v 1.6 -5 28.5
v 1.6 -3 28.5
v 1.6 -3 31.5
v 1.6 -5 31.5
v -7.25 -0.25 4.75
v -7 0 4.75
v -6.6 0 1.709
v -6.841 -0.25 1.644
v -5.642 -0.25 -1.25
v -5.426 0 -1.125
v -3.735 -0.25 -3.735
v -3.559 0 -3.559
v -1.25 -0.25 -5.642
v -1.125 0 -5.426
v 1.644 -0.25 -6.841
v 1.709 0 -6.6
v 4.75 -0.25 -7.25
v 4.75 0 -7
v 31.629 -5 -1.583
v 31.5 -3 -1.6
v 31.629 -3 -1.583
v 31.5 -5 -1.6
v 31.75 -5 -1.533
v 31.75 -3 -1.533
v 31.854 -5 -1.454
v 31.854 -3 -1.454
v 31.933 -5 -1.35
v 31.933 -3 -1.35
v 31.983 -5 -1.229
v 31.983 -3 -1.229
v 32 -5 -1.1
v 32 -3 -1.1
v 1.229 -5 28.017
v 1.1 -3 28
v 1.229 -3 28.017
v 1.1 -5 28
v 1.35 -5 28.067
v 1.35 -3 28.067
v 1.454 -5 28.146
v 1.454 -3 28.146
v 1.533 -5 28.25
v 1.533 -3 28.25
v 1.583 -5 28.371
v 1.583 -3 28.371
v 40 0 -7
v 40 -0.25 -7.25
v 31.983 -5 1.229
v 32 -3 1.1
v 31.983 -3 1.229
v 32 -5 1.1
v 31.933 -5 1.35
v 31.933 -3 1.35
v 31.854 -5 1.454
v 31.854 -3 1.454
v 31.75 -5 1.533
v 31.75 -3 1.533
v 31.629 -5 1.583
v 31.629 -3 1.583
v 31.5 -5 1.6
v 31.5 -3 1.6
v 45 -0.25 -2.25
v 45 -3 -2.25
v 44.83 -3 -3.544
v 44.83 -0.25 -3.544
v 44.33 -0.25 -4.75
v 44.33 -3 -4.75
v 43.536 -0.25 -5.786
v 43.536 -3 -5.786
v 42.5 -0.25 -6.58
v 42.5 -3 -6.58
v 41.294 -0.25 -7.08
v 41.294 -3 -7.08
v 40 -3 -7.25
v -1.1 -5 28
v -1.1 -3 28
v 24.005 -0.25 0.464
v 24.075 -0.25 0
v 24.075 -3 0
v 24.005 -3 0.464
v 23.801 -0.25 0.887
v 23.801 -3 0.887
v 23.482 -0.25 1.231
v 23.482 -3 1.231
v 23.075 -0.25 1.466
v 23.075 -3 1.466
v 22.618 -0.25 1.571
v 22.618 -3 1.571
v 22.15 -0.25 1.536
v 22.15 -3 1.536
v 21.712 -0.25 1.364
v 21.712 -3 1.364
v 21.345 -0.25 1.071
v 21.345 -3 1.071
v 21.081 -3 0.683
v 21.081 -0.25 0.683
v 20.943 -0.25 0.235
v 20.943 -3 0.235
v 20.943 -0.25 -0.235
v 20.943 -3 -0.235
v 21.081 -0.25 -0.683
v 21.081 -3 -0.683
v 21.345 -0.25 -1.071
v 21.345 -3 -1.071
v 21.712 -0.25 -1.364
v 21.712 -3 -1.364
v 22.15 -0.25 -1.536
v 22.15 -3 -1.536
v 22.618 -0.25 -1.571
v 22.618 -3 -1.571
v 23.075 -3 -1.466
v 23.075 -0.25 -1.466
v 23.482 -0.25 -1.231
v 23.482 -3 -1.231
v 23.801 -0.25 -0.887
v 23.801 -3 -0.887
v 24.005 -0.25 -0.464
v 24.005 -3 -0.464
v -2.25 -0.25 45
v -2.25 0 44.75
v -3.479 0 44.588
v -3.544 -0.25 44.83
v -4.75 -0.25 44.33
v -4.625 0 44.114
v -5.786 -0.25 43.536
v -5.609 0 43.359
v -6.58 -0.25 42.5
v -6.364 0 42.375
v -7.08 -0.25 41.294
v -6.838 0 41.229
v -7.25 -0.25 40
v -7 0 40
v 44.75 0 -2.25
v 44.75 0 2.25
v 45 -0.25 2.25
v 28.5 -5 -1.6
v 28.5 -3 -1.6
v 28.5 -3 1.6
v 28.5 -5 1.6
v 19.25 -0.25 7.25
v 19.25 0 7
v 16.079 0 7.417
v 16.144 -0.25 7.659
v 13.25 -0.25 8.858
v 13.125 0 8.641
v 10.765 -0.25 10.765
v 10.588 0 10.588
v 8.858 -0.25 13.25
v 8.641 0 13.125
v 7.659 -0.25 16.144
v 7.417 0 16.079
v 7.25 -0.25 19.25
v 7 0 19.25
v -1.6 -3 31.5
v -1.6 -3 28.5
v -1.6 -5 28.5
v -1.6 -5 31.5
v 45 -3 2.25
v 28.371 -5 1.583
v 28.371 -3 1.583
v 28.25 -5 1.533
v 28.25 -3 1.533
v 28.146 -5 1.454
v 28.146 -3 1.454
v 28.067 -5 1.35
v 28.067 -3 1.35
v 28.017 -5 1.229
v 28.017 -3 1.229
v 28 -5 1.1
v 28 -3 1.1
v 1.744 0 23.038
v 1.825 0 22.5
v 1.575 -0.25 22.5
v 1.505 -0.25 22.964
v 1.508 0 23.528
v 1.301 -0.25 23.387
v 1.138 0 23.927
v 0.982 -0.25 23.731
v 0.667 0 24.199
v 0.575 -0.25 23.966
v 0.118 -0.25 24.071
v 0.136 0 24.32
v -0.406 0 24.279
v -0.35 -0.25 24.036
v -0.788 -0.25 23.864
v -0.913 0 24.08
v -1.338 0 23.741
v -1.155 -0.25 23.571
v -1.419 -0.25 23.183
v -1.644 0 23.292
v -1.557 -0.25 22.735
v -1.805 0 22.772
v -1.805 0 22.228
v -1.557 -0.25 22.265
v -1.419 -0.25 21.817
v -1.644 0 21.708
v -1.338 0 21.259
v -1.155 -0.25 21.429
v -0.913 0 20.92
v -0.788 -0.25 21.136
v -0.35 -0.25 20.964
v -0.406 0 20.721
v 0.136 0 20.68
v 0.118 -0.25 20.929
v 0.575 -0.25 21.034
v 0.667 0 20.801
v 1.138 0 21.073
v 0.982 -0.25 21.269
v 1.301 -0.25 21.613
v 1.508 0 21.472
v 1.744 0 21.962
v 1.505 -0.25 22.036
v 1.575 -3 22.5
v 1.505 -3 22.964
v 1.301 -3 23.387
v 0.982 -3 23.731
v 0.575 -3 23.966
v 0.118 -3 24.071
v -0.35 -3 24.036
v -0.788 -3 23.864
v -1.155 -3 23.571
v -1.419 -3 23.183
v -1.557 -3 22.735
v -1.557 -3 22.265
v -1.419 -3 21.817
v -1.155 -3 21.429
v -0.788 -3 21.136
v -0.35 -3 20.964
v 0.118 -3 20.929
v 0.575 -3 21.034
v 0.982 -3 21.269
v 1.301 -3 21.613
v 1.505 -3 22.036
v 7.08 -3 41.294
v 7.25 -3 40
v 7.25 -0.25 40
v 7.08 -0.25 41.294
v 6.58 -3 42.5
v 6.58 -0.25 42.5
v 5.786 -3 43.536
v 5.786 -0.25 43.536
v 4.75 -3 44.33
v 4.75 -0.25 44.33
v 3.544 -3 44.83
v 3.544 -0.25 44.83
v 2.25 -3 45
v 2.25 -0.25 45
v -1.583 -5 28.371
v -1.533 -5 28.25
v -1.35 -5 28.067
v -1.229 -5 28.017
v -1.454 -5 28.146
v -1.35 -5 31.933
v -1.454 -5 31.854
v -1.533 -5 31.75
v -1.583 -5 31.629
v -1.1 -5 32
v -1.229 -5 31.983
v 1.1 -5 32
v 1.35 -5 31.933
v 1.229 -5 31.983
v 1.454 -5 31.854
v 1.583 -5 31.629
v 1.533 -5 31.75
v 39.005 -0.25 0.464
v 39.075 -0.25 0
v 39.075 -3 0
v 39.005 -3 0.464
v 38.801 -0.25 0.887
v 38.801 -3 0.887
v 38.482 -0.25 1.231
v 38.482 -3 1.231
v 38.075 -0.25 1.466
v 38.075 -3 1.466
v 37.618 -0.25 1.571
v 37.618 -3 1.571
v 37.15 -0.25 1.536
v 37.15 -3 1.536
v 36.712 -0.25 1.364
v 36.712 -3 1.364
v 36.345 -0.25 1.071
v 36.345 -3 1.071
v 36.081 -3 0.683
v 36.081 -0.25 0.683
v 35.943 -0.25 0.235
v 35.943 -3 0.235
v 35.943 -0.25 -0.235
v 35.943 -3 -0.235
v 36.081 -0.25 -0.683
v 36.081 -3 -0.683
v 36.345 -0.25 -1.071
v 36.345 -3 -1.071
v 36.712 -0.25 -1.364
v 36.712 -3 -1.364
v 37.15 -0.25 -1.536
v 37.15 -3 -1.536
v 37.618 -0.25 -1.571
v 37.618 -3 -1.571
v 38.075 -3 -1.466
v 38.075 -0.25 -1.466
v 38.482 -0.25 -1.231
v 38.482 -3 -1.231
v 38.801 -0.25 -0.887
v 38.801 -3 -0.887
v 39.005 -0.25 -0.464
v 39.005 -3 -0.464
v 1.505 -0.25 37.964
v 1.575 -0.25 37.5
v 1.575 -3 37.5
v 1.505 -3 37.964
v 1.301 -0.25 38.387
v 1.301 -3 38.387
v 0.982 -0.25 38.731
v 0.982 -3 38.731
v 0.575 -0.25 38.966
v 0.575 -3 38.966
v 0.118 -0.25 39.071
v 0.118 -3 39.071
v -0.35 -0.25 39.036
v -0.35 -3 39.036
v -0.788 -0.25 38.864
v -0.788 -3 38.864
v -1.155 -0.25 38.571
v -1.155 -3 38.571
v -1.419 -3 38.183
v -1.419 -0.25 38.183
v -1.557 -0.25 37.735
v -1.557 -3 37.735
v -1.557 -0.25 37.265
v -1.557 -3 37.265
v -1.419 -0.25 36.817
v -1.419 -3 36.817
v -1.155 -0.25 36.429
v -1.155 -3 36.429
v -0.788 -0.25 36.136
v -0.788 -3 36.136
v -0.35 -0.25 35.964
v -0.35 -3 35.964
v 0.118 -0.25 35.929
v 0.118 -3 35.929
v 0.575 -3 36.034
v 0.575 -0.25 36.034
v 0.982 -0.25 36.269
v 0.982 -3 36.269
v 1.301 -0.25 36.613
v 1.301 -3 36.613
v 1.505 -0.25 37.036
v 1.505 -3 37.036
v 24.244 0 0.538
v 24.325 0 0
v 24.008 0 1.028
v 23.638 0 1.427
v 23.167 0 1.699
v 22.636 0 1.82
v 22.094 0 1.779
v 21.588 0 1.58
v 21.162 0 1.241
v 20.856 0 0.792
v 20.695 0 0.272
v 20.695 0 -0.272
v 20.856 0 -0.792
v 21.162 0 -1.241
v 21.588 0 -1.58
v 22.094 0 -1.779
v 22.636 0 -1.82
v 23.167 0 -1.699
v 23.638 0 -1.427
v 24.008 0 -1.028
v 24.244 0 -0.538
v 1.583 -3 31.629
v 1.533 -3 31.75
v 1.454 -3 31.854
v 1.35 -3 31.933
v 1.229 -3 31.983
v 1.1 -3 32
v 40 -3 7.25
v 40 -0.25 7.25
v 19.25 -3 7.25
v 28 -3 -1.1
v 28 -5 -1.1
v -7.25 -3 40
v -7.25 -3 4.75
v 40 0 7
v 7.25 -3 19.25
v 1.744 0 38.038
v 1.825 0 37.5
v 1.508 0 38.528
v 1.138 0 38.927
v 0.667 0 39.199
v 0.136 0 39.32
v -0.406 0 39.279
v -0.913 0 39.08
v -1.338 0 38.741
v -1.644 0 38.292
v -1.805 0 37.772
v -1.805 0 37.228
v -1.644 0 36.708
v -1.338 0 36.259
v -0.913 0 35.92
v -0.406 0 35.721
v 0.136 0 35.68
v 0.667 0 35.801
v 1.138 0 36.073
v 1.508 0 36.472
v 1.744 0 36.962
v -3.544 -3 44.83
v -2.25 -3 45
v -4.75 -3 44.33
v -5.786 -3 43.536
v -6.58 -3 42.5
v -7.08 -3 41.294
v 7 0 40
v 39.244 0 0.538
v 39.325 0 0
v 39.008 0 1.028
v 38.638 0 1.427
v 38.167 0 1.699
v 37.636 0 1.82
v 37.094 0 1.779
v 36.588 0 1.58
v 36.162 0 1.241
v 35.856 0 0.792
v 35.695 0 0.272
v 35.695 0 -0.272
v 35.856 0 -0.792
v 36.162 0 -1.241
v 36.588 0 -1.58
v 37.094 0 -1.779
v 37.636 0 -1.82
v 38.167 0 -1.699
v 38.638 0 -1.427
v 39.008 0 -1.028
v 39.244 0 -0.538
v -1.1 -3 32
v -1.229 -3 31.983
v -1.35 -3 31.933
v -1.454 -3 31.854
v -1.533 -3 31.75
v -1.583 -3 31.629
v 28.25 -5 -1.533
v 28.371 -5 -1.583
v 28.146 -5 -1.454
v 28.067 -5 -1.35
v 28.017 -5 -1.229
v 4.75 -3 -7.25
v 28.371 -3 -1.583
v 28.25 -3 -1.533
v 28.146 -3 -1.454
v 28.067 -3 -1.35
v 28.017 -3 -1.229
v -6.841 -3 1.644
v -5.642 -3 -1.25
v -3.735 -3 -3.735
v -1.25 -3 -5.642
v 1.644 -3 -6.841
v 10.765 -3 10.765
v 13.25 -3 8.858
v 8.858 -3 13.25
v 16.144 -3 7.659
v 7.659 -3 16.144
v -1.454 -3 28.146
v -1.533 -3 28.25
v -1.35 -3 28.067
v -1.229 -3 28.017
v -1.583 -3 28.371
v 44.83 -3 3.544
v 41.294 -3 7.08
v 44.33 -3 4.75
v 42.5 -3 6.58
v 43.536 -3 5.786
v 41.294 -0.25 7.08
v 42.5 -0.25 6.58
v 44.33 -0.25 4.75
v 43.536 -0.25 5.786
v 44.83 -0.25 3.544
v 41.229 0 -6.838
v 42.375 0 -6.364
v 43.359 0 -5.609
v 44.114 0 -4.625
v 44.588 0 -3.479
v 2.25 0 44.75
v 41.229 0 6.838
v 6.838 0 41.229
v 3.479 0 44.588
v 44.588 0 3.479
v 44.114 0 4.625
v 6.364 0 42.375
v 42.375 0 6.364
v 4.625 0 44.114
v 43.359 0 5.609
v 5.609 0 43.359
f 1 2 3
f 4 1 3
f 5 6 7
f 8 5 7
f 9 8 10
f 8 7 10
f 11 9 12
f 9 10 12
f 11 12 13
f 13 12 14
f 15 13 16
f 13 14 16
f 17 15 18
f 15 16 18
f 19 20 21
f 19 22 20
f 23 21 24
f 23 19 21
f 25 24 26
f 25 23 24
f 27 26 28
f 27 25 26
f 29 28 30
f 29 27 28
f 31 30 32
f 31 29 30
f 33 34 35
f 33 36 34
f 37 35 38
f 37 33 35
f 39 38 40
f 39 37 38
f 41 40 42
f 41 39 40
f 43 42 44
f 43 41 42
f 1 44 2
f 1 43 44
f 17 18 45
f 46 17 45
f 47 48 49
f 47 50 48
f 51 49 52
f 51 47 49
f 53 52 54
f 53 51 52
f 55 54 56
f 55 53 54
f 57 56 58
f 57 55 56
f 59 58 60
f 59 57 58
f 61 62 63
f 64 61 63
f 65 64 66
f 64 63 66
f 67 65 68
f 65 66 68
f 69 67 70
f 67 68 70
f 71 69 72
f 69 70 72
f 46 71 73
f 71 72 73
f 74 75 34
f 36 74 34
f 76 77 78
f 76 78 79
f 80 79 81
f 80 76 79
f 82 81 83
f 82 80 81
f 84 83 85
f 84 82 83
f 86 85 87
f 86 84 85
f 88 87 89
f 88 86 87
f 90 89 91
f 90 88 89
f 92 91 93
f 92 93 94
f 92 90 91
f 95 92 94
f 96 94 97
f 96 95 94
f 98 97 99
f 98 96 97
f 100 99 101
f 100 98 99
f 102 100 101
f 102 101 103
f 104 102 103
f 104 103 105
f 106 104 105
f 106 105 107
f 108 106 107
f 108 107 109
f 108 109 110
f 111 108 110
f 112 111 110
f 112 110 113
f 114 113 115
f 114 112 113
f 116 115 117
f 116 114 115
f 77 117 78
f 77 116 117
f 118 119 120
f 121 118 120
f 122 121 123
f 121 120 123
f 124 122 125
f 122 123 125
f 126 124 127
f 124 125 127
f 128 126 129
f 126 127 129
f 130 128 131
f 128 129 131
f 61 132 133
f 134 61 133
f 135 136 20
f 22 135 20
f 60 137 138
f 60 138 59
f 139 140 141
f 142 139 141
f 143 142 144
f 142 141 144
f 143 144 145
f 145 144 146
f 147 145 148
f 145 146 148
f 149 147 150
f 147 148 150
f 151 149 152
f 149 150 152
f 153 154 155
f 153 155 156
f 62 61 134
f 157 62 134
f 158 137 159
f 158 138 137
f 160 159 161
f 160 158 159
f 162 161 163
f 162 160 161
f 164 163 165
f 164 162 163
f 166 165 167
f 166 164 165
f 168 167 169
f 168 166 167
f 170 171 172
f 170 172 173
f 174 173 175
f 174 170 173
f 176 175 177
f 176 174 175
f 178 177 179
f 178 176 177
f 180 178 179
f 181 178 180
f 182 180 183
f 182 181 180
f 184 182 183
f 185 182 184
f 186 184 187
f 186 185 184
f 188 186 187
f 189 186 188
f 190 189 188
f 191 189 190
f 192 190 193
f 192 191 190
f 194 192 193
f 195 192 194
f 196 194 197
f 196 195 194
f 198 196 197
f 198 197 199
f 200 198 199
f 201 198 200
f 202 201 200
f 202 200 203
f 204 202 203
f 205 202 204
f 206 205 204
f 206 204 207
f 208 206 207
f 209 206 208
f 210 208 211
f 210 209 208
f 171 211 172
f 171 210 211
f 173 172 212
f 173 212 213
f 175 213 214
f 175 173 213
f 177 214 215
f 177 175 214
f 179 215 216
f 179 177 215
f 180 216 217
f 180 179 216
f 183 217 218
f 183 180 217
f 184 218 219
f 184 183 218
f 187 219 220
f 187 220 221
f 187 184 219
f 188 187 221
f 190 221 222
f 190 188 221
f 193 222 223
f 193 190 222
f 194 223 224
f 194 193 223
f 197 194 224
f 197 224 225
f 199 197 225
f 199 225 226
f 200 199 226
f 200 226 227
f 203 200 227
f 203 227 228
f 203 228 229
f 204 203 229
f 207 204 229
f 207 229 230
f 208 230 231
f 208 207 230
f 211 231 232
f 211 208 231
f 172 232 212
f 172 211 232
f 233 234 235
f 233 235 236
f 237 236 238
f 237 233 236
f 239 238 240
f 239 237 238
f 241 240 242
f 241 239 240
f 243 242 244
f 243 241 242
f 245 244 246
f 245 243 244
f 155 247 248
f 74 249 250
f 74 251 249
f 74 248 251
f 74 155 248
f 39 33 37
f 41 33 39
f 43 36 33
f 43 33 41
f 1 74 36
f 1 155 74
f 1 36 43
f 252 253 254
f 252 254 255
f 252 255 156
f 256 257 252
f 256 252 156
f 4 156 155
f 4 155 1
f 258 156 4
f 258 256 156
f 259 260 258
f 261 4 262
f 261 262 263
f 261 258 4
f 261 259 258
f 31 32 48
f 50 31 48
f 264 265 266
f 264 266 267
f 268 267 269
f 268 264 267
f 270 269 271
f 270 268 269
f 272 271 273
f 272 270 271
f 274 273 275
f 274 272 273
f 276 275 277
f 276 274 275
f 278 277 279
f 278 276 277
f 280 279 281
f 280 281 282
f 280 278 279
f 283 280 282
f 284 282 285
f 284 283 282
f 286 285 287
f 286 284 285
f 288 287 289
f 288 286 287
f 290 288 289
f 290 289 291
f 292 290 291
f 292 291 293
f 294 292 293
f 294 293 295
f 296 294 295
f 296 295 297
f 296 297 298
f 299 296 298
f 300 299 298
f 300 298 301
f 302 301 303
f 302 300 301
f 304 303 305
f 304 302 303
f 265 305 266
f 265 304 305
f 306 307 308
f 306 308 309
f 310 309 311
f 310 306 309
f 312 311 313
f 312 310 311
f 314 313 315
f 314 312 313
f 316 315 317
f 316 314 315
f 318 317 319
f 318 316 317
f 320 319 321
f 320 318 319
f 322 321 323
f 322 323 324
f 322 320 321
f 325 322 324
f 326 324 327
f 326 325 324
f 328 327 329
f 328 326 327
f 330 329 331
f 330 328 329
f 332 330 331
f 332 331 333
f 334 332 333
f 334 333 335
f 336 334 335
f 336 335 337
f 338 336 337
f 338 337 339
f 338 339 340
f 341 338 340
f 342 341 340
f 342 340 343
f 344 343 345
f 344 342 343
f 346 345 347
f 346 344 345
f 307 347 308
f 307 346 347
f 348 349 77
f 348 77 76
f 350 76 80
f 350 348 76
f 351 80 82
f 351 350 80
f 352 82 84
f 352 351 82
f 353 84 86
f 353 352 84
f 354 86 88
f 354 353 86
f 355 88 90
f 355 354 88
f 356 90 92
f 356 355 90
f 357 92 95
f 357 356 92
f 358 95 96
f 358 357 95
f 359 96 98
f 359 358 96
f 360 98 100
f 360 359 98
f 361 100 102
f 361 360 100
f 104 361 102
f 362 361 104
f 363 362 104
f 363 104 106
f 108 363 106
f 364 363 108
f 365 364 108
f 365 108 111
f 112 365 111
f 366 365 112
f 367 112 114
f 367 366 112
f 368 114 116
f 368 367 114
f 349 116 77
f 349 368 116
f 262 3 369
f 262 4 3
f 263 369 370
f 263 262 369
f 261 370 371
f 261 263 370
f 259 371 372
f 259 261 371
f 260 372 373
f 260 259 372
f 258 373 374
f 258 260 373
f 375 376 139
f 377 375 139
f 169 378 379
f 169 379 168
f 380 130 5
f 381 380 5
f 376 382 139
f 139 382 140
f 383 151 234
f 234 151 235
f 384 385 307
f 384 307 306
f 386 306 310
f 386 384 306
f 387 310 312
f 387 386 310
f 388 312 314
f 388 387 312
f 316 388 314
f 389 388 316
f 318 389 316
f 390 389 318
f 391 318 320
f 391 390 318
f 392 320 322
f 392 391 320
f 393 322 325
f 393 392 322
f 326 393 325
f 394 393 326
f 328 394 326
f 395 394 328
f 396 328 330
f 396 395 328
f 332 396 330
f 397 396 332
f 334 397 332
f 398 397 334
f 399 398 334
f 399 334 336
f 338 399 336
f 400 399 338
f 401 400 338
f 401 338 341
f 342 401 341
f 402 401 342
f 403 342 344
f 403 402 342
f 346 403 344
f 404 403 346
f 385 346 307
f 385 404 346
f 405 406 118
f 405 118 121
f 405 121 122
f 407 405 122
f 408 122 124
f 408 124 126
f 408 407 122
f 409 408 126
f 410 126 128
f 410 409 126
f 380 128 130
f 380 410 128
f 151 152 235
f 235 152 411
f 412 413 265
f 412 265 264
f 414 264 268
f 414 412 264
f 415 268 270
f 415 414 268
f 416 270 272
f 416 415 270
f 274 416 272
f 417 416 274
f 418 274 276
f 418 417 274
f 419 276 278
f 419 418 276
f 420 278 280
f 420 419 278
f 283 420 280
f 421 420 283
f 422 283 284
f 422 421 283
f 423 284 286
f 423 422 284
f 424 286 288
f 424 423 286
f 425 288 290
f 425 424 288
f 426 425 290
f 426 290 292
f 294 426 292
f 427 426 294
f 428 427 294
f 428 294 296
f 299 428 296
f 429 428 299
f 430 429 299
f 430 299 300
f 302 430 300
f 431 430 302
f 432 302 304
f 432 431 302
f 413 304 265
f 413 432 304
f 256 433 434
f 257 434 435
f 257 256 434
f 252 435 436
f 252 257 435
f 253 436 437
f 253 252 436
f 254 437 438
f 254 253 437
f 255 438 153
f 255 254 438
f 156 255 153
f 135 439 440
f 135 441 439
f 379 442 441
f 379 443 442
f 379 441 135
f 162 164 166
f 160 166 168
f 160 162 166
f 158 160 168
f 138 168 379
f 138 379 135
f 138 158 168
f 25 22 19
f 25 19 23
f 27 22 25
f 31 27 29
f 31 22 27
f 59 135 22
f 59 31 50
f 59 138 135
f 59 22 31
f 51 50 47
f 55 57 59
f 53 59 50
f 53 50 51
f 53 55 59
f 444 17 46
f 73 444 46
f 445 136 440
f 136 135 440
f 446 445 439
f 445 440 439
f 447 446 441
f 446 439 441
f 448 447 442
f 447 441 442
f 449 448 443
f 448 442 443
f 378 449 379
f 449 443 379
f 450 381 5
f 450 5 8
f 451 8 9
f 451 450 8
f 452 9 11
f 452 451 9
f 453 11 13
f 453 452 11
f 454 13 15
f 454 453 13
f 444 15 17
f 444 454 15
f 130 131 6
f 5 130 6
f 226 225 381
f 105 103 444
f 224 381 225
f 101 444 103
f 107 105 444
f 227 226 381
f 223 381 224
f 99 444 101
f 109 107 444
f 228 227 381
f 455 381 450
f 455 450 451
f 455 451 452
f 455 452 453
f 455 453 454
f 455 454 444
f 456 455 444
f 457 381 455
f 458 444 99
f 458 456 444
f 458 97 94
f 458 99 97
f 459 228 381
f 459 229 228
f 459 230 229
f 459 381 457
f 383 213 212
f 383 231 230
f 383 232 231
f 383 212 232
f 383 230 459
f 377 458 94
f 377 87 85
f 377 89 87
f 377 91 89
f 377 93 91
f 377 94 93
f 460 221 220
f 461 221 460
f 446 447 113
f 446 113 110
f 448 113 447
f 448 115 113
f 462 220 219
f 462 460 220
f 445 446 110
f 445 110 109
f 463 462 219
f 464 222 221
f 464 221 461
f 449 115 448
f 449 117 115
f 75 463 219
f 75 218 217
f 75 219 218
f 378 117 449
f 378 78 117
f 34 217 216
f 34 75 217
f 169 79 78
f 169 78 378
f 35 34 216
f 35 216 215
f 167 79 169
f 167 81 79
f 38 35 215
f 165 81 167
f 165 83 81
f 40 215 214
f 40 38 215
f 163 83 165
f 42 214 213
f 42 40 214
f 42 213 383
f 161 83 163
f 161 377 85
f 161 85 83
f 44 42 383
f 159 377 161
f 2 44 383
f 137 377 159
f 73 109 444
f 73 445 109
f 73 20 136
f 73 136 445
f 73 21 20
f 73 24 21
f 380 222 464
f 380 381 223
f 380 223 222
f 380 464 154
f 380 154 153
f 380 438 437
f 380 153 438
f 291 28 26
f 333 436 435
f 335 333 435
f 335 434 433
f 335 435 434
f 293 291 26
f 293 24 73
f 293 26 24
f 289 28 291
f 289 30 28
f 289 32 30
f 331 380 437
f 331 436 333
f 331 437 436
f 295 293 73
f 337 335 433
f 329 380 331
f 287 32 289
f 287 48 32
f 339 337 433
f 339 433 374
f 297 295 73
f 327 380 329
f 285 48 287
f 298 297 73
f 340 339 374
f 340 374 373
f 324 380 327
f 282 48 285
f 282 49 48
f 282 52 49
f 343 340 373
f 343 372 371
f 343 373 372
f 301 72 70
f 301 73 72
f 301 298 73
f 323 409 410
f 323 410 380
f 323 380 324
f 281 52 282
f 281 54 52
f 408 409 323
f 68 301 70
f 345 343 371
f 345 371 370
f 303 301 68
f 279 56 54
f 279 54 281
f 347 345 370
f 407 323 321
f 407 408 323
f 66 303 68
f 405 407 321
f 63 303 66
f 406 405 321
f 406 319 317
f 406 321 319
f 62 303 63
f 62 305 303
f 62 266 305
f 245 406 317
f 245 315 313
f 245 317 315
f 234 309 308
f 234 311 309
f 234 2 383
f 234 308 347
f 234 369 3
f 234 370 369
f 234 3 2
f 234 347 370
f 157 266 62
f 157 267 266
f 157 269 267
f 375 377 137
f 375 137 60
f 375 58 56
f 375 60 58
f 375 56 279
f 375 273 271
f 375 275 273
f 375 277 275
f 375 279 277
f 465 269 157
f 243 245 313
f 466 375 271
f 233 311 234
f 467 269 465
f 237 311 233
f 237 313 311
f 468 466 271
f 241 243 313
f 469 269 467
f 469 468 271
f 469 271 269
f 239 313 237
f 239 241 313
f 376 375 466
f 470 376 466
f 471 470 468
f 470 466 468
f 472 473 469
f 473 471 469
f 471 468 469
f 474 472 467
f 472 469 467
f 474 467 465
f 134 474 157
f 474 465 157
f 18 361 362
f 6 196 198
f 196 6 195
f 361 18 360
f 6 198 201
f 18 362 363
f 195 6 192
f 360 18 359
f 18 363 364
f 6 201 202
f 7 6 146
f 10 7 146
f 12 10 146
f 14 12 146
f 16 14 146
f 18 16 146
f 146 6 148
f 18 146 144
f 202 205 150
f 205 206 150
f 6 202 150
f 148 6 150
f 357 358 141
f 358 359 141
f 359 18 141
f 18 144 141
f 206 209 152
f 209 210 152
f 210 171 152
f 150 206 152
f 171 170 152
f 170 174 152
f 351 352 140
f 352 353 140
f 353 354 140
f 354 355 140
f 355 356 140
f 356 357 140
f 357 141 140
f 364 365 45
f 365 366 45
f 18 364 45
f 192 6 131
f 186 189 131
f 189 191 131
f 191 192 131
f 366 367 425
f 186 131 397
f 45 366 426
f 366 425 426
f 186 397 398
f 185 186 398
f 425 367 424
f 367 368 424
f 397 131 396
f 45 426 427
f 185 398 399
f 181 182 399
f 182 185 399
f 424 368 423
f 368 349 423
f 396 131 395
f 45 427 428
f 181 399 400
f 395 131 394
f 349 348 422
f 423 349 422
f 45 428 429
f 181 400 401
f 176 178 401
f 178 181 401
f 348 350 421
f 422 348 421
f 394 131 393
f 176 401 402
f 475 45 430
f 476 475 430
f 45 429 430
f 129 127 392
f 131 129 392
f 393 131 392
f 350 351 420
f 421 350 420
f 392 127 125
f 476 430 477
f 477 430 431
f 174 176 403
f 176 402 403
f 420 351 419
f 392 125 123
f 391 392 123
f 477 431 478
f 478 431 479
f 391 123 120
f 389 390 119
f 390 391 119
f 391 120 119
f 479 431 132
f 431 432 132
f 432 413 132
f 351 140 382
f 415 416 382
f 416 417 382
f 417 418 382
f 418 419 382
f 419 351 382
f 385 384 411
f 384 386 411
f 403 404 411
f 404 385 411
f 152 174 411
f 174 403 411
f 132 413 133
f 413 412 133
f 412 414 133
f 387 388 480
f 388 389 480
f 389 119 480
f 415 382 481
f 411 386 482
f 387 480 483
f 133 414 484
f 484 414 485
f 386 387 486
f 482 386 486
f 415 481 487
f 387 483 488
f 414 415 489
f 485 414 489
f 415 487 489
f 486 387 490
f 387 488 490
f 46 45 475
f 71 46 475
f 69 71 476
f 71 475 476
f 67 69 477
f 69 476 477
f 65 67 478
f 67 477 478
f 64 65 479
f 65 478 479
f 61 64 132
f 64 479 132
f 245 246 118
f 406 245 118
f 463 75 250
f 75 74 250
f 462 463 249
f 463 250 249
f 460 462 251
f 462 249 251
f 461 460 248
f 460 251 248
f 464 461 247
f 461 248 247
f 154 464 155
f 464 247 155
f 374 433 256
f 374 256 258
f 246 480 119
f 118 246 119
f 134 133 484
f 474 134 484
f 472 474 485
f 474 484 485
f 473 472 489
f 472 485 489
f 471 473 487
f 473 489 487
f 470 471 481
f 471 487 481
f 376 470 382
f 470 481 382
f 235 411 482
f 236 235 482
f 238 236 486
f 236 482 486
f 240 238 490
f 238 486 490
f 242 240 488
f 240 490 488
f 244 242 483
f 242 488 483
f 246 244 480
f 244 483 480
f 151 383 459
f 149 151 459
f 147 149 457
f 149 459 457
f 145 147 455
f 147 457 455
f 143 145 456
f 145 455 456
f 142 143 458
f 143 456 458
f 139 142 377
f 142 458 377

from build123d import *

# Parameters (mm, degrees)
F0_R     = 1.575
F1_DEPTH = 3
F2_R     = 5
F3_R     = 12
F4_W     = 3.2
F4_H     = 4
F4_W_2   = 4
F4_H_2   = 3.2
F5_DEPTH = 2
F6_R     = 0.5
F7_SIZE  = 0.25


with BuildPart() as f1:
    # F0 (on Front) → F1 (new body)
    with BuildSketch(Plane.XZ):
        Polygon((7.25, 7.25), (7.25, 45), (-7.25, 45), (-7.25, -7.25), (45, -7.25), (45, 7.25), align=None)
        with Locations((22.5, 0)):
            Circle(F0_R, mode=Mode.SUBTRACT)
        with Locations((37.5, 0)):
            Circle(F0_R, mode=Mode.SUBTRACT)
        with Locations((0, 22.5)):
            Circle(F0_R, mode=Mode.SUBTRACT)
        with Locations((0, 37.5)):
            Circle(F0_R, mode=Mode.SUBTRACT)
    extrude(amount=F1_DEPTH)

    # F2
    f2_edges = [f1.edges().sort_by_distance(p)[0] for p in [
        (-7.25, -1.5, 45),
        (7.25, -1.5, 45),
        (45, -1.5, 7.25),
        (45, -1.5, -7.25),
    ]]
    fillet(f2_edges, radius=F2_R)

    # F3
    f3_edges = [f1.edges().sort_by_distance(p)[0] for p in [
        (7.25, -1.5, 7.25),
        (-7.25, -1.5, -7.25),
    ]]
    fillet(f3_edges, radius=F3_R)

    # F4 (on face) → F5 (join)
    with BuildSketch(Plane.XZ.offset(3)):
        with Locations((0, 30)):
            Rectangle(F4_W, F4_H)
        with Locations((30, 0)):
            Rectangle(F4_W_2, F4_H_2)
    extrude(amount=F5_DEPTH)

    # F6
    f6_edges = [f1.edges().sort_by_distance(p)[0] for p in [
        (28, -4, -1.6),
        (32, -4, -1.6),
        (32, -4, 1.6),
        (28, -4, 1.6),
        (-1.6, -4, 28),
        (-1.6, -4, 32),
        (1.6, -4, 28),
        (1.6, -4, 32),
    ]]
    fillet(f6_edges, radius=F6_R)

    # F7
    f7_edges = [f1.edges().sort_by_distance(p)[0] for p in [
        (7.25, 0, 29.625),
        (10.764719, 0, 10.764719),
        (5.785534, 0, 43.535534),
        (29.625, 0, 7.25),
        (0, 0, 45),
        (43.535534, 0, 5.785534),
        (-5.785534, 0, 43.535534),
        (45, 0, 0),
        (-7.25, 0, 22.375),
        (43.535534, 0, -5.785534),
        (-3.735281, 0, -3.735281),
        (22.375, 0, -7.25),
        (20.925, 0, 0),
        (35.925, 0, 0),
        (-1.575, 0, 22.5),
        (-1.575, 0, 37.5),
    ]]
    chamfer(f7_edges, length=F7_SIZE)


solid = f1.part
